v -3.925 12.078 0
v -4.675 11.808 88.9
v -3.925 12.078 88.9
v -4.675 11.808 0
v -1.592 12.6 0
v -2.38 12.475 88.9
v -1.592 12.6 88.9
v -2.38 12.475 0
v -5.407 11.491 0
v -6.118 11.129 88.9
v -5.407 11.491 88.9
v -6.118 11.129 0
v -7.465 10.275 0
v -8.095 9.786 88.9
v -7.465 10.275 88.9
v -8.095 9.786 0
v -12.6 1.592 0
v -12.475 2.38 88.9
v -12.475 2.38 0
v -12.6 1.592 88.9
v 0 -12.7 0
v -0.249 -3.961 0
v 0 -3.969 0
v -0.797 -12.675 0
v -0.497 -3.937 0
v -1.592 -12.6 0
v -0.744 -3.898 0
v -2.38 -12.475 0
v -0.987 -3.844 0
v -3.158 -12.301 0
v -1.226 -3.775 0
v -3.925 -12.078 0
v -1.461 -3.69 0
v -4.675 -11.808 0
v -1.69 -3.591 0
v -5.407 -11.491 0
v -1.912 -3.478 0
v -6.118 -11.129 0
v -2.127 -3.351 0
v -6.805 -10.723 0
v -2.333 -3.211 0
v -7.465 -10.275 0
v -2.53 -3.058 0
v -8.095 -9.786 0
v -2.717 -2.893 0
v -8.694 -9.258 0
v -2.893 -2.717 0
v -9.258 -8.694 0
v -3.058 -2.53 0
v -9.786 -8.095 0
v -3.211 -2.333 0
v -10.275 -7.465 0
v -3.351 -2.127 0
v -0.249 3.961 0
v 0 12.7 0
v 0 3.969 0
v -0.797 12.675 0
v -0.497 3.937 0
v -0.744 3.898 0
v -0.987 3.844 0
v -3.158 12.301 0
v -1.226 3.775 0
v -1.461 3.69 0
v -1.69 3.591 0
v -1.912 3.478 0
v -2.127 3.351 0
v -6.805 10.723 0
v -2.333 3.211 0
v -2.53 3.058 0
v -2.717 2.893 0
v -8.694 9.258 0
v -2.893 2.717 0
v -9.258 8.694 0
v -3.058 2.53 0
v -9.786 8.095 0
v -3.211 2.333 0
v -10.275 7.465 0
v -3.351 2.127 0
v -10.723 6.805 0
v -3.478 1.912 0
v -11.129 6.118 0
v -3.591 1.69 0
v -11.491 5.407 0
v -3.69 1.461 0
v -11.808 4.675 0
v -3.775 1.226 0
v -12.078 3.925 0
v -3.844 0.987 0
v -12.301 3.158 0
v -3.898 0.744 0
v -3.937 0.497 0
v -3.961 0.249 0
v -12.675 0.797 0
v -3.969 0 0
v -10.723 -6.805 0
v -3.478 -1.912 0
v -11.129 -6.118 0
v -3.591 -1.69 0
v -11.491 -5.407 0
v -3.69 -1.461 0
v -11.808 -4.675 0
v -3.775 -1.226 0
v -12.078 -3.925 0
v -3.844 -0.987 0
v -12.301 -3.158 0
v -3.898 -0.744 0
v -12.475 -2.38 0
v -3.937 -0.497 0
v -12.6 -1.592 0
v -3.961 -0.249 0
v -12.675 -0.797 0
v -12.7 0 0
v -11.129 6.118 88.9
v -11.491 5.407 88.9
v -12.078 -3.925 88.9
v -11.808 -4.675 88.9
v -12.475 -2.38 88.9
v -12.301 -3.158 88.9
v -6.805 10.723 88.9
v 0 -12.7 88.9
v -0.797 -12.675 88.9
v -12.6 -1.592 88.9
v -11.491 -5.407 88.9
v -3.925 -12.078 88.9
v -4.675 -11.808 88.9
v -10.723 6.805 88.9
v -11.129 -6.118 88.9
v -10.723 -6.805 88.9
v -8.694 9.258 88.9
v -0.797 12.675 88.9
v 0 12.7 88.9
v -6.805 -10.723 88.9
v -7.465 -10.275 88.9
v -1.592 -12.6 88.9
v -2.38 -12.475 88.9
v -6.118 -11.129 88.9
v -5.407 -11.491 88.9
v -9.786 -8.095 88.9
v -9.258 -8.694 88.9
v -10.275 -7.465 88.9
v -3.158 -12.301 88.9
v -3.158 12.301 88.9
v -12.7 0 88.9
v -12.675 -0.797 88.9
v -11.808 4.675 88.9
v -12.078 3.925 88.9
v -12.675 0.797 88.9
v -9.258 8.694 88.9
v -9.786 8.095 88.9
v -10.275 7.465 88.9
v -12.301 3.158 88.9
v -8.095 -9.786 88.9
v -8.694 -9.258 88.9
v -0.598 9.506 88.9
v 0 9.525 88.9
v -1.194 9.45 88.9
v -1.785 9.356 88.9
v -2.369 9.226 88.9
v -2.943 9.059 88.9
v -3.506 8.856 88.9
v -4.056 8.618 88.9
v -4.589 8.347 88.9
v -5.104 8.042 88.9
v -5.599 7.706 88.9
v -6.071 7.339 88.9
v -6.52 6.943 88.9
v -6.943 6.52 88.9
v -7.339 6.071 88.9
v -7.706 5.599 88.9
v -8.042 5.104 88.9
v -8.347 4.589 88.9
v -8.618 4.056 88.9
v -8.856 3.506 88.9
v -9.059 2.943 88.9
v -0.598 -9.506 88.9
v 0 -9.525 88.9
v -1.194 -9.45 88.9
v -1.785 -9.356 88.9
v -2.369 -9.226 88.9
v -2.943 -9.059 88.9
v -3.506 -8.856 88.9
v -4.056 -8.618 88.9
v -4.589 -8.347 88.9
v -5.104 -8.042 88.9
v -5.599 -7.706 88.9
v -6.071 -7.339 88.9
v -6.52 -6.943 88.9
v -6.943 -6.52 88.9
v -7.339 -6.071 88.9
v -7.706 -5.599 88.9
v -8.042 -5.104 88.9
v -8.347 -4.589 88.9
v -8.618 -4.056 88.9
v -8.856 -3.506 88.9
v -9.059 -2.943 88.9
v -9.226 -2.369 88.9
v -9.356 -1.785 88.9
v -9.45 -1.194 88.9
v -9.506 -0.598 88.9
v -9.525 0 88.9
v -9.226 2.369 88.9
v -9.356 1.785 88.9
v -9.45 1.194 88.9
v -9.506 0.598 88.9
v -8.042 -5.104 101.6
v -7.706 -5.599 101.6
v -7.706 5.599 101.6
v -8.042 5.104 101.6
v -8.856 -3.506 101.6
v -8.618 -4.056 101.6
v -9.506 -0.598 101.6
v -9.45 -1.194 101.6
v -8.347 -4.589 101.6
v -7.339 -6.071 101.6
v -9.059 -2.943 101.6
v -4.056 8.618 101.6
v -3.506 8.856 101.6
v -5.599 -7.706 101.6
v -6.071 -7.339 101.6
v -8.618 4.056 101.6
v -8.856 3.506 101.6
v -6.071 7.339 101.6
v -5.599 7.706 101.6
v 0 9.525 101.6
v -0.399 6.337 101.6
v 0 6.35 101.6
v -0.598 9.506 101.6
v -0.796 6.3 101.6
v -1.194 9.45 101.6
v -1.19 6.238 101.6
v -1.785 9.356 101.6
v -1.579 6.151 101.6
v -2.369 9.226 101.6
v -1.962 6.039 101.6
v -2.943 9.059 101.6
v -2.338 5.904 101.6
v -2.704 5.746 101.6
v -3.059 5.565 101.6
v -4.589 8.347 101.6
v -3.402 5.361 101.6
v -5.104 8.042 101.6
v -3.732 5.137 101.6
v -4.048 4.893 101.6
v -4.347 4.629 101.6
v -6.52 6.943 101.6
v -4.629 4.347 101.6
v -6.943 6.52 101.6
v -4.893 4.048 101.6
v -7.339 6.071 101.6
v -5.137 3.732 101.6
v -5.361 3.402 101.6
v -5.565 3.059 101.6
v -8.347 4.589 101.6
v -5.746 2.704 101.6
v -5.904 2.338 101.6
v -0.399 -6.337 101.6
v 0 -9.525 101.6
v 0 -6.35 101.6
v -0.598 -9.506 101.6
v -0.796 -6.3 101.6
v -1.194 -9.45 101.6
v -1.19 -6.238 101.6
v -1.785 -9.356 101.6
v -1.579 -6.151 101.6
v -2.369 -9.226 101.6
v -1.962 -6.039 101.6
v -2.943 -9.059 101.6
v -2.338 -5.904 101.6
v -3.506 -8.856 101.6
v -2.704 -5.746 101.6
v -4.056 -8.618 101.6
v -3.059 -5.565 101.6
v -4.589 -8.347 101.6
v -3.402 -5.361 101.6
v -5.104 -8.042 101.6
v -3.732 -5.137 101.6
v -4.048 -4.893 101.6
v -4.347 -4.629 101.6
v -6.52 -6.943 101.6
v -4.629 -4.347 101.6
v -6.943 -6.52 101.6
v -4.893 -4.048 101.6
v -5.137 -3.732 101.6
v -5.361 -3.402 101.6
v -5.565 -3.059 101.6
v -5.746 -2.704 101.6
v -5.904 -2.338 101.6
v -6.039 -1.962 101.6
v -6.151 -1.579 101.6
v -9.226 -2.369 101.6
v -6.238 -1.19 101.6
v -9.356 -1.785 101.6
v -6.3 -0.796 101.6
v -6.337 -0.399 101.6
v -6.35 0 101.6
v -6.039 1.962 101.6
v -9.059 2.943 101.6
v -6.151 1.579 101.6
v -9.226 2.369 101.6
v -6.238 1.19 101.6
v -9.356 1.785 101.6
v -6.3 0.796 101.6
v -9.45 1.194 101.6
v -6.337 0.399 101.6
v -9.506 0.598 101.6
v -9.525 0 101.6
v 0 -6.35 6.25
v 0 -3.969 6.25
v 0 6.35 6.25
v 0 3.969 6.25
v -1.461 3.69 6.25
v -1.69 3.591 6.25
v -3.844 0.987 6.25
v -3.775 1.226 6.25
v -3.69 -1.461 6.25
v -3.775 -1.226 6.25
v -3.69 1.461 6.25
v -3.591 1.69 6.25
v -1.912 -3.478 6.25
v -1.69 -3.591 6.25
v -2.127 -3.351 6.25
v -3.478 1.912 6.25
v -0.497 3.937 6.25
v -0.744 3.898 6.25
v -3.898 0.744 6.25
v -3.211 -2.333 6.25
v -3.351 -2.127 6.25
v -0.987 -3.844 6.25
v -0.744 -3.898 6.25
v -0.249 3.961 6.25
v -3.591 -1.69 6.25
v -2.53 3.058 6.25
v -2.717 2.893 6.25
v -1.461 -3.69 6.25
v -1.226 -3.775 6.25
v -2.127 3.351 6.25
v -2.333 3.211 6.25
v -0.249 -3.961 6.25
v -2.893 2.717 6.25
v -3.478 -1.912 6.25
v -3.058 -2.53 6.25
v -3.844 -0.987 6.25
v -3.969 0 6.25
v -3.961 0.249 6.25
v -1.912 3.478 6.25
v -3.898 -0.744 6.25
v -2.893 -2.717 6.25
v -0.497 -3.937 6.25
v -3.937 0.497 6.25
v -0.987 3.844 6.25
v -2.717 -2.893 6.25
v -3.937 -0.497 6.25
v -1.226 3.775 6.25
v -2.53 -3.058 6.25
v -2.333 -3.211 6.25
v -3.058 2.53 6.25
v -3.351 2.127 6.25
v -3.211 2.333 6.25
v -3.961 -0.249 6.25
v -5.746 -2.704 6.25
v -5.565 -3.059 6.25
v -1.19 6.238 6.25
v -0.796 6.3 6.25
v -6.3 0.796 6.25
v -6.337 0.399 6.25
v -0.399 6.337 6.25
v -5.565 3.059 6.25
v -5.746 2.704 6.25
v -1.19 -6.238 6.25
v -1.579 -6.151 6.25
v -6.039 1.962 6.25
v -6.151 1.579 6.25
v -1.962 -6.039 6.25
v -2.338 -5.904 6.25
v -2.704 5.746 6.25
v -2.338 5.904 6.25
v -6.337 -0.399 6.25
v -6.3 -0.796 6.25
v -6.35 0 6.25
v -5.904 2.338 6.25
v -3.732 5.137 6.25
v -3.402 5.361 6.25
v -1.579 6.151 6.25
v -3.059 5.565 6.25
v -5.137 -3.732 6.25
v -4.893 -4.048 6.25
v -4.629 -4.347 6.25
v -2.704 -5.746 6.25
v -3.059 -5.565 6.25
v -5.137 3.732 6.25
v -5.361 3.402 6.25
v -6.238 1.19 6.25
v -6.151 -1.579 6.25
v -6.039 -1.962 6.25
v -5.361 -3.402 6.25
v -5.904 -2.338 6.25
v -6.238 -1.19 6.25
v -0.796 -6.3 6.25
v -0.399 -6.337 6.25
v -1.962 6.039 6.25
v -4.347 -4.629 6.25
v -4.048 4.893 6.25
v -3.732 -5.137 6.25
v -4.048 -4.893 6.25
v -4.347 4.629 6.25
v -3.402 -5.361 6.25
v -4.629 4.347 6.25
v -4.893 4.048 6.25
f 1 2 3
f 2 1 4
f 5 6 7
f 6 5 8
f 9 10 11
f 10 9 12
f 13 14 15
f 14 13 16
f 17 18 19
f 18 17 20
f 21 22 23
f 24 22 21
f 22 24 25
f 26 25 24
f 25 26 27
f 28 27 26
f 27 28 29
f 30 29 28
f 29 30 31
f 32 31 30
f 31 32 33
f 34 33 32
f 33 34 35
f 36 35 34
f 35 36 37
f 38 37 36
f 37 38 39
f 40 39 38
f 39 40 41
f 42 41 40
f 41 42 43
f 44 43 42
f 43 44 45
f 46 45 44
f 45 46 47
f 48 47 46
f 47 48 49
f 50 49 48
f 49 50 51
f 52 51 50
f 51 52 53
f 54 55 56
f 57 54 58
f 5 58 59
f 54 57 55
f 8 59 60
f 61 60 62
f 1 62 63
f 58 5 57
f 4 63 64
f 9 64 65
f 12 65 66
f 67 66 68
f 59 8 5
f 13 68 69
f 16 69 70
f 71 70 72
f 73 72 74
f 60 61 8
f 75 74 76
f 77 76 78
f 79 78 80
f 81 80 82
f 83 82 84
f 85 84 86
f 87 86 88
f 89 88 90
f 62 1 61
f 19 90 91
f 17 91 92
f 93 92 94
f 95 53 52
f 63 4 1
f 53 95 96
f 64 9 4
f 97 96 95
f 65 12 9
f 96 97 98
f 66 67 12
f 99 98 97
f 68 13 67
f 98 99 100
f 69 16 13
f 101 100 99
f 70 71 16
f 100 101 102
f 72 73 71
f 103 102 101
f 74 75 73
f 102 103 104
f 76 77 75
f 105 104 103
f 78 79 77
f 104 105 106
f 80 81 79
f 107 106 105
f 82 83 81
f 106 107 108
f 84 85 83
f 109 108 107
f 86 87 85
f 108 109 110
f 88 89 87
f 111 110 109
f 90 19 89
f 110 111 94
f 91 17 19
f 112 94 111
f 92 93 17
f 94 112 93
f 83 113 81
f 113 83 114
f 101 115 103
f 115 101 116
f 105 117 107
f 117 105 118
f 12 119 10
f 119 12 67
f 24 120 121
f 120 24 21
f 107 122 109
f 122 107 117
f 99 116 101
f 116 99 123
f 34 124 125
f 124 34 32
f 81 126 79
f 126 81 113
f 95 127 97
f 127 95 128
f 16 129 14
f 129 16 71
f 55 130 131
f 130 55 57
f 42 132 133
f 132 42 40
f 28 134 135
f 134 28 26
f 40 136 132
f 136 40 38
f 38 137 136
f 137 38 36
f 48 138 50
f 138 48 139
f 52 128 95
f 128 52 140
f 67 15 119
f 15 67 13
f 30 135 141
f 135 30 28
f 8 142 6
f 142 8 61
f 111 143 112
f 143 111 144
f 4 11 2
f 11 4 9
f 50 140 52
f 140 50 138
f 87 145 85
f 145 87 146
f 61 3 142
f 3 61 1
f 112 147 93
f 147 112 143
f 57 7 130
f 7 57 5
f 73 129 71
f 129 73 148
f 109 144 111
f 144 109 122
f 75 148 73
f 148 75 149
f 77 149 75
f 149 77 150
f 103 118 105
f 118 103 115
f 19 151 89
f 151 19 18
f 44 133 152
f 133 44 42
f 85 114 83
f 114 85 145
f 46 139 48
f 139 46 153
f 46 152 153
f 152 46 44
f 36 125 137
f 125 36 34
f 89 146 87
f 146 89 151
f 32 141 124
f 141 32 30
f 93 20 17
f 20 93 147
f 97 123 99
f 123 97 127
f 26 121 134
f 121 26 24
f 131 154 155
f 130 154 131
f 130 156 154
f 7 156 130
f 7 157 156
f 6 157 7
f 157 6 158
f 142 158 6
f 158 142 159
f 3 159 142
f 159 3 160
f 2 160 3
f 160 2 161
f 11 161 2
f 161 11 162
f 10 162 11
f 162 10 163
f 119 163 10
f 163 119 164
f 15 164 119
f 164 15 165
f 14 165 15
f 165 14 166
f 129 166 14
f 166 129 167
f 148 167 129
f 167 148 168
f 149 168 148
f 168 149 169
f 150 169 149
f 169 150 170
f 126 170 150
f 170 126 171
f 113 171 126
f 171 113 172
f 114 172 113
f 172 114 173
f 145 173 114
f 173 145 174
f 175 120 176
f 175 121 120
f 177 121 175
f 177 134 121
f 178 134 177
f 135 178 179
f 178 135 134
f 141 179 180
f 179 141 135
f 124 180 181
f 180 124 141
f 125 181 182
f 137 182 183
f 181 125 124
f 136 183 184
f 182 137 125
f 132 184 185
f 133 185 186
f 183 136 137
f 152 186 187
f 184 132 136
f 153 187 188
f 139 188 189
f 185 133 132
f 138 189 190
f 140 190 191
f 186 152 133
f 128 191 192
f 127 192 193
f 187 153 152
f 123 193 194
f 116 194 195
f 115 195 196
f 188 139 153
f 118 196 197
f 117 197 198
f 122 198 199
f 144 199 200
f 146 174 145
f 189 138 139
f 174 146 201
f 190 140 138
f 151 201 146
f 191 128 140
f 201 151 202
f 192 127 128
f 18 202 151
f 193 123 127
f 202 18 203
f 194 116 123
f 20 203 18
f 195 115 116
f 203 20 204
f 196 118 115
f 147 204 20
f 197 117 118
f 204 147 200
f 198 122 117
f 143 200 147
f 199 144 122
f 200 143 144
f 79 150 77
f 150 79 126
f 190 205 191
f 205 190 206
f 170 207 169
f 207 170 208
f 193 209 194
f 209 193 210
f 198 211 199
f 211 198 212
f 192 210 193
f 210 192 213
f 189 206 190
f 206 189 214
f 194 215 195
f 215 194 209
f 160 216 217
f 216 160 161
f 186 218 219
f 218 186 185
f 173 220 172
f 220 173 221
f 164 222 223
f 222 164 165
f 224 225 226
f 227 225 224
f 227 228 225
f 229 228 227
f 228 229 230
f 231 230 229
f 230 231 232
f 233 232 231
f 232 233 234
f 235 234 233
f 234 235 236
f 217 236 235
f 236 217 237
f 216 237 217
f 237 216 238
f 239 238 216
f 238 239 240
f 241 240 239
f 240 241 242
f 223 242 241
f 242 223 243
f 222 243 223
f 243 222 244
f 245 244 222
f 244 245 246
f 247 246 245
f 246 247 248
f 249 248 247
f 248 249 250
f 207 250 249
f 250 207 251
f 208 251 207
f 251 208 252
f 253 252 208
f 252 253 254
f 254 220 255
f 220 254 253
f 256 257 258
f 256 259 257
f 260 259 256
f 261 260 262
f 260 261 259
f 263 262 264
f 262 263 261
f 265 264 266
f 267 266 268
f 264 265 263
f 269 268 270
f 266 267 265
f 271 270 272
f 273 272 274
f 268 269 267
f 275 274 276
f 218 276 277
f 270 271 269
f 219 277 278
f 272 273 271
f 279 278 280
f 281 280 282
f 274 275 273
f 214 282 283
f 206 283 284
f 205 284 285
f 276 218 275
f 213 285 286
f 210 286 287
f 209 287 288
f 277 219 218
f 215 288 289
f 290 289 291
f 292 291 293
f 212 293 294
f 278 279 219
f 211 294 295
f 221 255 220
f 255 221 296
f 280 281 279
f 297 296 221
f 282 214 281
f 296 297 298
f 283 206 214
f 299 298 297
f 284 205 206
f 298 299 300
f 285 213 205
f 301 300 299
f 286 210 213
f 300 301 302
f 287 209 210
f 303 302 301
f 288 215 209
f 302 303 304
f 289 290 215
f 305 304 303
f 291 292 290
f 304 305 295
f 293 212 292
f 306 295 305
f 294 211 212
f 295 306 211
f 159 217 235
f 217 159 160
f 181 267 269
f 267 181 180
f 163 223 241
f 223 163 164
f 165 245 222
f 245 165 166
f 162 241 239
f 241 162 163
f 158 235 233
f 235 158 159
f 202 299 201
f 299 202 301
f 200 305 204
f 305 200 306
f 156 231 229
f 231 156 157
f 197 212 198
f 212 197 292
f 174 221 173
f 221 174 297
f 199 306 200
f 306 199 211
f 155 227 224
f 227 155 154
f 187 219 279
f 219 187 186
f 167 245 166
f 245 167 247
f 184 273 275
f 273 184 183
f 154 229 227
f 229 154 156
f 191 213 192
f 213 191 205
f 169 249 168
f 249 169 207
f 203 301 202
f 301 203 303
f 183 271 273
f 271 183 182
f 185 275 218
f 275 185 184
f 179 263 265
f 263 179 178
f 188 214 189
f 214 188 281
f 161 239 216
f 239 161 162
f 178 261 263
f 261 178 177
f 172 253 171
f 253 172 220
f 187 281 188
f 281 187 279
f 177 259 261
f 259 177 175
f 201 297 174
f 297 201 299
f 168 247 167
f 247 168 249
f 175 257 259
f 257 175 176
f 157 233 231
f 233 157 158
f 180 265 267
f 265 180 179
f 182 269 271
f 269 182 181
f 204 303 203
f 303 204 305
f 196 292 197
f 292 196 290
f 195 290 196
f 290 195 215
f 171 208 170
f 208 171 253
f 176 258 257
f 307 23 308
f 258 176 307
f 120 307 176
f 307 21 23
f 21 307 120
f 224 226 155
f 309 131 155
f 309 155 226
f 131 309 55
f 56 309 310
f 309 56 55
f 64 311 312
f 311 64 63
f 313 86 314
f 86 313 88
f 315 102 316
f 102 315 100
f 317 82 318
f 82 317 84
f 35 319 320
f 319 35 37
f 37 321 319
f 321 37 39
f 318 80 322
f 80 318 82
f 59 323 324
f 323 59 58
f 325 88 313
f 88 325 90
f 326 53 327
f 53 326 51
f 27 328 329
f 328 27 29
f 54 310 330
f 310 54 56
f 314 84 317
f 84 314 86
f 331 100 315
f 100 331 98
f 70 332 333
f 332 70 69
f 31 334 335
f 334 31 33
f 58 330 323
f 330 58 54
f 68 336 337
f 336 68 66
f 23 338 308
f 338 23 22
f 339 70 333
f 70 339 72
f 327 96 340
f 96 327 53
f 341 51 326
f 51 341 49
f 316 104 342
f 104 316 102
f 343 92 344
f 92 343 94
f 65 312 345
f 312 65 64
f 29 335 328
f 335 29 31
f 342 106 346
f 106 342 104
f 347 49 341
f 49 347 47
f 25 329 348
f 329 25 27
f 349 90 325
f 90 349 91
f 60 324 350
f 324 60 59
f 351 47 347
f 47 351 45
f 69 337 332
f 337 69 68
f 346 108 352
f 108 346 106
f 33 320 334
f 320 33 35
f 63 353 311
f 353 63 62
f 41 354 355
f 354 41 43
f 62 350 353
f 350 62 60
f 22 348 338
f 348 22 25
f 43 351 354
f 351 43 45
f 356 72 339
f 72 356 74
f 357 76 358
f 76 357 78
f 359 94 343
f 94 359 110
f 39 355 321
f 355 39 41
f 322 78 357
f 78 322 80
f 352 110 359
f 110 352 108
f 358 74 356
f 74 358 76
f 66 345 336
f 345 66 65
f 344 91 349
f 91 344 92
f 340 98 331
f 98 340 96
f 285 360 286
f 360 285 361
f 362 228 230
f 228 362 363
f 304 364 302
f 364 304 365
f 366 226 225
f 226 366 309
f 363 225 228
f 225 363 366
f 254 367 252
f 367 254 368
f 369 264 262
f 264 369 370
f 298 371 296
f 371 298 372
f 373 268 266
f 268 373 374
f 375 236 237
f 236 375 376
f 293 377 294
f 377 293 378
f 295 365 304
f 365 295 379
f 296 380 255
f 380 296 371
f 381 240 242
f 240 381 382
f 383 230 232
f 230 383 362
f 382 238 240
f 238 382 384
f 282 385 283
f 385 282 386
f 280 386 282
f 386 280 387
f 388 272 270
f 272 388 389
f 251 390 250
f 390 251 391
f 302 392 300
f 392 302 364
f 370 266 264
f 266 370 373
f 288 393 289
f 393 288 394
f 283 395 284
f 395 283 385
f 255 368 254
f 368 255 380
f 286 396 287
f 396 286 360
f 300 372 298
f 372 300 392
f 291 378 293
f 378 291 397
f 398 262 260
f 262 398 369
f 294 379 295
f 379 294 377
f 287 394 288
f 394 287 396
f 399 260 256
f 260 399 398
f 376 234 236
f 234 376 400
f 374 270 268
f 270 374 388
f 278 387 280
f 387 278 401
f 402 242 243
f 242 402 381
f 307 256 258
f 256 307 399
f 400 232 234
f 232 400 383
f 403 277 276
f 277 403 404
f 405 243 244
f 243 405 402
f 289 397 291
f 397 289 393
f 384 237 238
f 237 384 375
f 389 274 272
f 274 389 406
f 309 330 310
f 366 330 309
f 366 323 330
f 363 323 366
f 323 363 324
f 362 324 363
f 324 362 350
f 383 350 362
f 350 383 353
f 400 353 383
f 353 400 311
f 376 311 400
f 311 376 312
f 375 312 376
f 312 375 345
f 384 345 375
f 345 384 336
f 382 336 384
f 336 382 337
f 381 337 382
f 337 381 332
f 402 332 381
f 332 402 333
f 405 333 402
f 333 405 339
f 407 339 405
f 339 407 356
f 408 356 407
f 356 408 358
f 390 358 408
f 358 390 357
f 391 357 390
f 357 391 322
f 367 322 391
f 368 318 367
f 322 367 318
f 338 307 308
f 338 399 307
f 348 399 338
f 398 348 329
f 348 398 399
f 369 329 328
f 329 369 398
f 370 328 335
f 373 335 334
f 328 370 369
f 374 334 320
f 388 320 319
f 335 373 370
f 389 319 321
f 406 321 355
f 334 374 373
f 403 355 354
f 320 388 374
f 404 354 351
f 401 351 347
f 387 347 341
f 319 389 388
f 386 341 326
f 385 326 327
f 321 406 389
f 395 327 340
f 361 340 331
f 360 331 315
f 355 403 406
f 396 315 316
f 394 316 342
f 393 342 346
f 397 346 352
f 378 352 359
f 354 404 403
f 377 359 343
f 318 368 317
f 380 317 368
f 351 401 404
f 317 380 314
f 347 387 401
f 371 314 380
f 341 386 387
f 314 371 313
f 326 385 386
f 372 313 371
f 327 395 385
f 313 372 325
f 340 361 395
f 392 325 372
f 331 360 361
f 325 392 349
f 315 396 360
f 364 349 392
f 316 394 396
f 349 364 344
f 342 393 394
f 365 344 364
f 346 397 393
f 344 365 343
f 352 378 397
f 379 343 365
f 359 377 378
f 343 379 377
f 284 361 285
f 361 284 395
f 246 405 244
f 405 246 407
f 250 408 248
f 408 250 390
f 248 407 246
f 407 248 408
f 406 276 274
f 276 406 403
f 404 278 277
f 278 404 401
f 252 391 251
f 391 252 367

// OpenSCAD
// Units in INCHES

OR = 25.4*1/2;				//Outside Diameter
OL = 25.4*4;				//Overall Length
IR = 25.4*1/4;				//Large Inner Diameter
TR = 25.4*5/32;			//Throat Diameter
IL = 25.4*2.8;				//Internal Length
TL = 25.4*0.25;			//Throat Length
TrR= 25.4*3/8;				//Thread Outer Diameter
TrL= 25.4*0.5;				//Thread Length

difference() {
	union() {
		cylinder(r=OR, h=OL-TrL, $fn=100);
		translate([0,0,OL-TrL]) cylinder(r=TrR, h=TrL, $fn=100);
	}
	translate([0,-OR,-0.1]) cube(size = [OR*2,OR*2,OL+.2]);
	translate([0,0,-0.1]) cylinder(r=TR, h=TL+.2, $fn=100);
	translate([0,0,TL-0.1]) cylinder(r=IR, h=OL, $fn=100);
}
